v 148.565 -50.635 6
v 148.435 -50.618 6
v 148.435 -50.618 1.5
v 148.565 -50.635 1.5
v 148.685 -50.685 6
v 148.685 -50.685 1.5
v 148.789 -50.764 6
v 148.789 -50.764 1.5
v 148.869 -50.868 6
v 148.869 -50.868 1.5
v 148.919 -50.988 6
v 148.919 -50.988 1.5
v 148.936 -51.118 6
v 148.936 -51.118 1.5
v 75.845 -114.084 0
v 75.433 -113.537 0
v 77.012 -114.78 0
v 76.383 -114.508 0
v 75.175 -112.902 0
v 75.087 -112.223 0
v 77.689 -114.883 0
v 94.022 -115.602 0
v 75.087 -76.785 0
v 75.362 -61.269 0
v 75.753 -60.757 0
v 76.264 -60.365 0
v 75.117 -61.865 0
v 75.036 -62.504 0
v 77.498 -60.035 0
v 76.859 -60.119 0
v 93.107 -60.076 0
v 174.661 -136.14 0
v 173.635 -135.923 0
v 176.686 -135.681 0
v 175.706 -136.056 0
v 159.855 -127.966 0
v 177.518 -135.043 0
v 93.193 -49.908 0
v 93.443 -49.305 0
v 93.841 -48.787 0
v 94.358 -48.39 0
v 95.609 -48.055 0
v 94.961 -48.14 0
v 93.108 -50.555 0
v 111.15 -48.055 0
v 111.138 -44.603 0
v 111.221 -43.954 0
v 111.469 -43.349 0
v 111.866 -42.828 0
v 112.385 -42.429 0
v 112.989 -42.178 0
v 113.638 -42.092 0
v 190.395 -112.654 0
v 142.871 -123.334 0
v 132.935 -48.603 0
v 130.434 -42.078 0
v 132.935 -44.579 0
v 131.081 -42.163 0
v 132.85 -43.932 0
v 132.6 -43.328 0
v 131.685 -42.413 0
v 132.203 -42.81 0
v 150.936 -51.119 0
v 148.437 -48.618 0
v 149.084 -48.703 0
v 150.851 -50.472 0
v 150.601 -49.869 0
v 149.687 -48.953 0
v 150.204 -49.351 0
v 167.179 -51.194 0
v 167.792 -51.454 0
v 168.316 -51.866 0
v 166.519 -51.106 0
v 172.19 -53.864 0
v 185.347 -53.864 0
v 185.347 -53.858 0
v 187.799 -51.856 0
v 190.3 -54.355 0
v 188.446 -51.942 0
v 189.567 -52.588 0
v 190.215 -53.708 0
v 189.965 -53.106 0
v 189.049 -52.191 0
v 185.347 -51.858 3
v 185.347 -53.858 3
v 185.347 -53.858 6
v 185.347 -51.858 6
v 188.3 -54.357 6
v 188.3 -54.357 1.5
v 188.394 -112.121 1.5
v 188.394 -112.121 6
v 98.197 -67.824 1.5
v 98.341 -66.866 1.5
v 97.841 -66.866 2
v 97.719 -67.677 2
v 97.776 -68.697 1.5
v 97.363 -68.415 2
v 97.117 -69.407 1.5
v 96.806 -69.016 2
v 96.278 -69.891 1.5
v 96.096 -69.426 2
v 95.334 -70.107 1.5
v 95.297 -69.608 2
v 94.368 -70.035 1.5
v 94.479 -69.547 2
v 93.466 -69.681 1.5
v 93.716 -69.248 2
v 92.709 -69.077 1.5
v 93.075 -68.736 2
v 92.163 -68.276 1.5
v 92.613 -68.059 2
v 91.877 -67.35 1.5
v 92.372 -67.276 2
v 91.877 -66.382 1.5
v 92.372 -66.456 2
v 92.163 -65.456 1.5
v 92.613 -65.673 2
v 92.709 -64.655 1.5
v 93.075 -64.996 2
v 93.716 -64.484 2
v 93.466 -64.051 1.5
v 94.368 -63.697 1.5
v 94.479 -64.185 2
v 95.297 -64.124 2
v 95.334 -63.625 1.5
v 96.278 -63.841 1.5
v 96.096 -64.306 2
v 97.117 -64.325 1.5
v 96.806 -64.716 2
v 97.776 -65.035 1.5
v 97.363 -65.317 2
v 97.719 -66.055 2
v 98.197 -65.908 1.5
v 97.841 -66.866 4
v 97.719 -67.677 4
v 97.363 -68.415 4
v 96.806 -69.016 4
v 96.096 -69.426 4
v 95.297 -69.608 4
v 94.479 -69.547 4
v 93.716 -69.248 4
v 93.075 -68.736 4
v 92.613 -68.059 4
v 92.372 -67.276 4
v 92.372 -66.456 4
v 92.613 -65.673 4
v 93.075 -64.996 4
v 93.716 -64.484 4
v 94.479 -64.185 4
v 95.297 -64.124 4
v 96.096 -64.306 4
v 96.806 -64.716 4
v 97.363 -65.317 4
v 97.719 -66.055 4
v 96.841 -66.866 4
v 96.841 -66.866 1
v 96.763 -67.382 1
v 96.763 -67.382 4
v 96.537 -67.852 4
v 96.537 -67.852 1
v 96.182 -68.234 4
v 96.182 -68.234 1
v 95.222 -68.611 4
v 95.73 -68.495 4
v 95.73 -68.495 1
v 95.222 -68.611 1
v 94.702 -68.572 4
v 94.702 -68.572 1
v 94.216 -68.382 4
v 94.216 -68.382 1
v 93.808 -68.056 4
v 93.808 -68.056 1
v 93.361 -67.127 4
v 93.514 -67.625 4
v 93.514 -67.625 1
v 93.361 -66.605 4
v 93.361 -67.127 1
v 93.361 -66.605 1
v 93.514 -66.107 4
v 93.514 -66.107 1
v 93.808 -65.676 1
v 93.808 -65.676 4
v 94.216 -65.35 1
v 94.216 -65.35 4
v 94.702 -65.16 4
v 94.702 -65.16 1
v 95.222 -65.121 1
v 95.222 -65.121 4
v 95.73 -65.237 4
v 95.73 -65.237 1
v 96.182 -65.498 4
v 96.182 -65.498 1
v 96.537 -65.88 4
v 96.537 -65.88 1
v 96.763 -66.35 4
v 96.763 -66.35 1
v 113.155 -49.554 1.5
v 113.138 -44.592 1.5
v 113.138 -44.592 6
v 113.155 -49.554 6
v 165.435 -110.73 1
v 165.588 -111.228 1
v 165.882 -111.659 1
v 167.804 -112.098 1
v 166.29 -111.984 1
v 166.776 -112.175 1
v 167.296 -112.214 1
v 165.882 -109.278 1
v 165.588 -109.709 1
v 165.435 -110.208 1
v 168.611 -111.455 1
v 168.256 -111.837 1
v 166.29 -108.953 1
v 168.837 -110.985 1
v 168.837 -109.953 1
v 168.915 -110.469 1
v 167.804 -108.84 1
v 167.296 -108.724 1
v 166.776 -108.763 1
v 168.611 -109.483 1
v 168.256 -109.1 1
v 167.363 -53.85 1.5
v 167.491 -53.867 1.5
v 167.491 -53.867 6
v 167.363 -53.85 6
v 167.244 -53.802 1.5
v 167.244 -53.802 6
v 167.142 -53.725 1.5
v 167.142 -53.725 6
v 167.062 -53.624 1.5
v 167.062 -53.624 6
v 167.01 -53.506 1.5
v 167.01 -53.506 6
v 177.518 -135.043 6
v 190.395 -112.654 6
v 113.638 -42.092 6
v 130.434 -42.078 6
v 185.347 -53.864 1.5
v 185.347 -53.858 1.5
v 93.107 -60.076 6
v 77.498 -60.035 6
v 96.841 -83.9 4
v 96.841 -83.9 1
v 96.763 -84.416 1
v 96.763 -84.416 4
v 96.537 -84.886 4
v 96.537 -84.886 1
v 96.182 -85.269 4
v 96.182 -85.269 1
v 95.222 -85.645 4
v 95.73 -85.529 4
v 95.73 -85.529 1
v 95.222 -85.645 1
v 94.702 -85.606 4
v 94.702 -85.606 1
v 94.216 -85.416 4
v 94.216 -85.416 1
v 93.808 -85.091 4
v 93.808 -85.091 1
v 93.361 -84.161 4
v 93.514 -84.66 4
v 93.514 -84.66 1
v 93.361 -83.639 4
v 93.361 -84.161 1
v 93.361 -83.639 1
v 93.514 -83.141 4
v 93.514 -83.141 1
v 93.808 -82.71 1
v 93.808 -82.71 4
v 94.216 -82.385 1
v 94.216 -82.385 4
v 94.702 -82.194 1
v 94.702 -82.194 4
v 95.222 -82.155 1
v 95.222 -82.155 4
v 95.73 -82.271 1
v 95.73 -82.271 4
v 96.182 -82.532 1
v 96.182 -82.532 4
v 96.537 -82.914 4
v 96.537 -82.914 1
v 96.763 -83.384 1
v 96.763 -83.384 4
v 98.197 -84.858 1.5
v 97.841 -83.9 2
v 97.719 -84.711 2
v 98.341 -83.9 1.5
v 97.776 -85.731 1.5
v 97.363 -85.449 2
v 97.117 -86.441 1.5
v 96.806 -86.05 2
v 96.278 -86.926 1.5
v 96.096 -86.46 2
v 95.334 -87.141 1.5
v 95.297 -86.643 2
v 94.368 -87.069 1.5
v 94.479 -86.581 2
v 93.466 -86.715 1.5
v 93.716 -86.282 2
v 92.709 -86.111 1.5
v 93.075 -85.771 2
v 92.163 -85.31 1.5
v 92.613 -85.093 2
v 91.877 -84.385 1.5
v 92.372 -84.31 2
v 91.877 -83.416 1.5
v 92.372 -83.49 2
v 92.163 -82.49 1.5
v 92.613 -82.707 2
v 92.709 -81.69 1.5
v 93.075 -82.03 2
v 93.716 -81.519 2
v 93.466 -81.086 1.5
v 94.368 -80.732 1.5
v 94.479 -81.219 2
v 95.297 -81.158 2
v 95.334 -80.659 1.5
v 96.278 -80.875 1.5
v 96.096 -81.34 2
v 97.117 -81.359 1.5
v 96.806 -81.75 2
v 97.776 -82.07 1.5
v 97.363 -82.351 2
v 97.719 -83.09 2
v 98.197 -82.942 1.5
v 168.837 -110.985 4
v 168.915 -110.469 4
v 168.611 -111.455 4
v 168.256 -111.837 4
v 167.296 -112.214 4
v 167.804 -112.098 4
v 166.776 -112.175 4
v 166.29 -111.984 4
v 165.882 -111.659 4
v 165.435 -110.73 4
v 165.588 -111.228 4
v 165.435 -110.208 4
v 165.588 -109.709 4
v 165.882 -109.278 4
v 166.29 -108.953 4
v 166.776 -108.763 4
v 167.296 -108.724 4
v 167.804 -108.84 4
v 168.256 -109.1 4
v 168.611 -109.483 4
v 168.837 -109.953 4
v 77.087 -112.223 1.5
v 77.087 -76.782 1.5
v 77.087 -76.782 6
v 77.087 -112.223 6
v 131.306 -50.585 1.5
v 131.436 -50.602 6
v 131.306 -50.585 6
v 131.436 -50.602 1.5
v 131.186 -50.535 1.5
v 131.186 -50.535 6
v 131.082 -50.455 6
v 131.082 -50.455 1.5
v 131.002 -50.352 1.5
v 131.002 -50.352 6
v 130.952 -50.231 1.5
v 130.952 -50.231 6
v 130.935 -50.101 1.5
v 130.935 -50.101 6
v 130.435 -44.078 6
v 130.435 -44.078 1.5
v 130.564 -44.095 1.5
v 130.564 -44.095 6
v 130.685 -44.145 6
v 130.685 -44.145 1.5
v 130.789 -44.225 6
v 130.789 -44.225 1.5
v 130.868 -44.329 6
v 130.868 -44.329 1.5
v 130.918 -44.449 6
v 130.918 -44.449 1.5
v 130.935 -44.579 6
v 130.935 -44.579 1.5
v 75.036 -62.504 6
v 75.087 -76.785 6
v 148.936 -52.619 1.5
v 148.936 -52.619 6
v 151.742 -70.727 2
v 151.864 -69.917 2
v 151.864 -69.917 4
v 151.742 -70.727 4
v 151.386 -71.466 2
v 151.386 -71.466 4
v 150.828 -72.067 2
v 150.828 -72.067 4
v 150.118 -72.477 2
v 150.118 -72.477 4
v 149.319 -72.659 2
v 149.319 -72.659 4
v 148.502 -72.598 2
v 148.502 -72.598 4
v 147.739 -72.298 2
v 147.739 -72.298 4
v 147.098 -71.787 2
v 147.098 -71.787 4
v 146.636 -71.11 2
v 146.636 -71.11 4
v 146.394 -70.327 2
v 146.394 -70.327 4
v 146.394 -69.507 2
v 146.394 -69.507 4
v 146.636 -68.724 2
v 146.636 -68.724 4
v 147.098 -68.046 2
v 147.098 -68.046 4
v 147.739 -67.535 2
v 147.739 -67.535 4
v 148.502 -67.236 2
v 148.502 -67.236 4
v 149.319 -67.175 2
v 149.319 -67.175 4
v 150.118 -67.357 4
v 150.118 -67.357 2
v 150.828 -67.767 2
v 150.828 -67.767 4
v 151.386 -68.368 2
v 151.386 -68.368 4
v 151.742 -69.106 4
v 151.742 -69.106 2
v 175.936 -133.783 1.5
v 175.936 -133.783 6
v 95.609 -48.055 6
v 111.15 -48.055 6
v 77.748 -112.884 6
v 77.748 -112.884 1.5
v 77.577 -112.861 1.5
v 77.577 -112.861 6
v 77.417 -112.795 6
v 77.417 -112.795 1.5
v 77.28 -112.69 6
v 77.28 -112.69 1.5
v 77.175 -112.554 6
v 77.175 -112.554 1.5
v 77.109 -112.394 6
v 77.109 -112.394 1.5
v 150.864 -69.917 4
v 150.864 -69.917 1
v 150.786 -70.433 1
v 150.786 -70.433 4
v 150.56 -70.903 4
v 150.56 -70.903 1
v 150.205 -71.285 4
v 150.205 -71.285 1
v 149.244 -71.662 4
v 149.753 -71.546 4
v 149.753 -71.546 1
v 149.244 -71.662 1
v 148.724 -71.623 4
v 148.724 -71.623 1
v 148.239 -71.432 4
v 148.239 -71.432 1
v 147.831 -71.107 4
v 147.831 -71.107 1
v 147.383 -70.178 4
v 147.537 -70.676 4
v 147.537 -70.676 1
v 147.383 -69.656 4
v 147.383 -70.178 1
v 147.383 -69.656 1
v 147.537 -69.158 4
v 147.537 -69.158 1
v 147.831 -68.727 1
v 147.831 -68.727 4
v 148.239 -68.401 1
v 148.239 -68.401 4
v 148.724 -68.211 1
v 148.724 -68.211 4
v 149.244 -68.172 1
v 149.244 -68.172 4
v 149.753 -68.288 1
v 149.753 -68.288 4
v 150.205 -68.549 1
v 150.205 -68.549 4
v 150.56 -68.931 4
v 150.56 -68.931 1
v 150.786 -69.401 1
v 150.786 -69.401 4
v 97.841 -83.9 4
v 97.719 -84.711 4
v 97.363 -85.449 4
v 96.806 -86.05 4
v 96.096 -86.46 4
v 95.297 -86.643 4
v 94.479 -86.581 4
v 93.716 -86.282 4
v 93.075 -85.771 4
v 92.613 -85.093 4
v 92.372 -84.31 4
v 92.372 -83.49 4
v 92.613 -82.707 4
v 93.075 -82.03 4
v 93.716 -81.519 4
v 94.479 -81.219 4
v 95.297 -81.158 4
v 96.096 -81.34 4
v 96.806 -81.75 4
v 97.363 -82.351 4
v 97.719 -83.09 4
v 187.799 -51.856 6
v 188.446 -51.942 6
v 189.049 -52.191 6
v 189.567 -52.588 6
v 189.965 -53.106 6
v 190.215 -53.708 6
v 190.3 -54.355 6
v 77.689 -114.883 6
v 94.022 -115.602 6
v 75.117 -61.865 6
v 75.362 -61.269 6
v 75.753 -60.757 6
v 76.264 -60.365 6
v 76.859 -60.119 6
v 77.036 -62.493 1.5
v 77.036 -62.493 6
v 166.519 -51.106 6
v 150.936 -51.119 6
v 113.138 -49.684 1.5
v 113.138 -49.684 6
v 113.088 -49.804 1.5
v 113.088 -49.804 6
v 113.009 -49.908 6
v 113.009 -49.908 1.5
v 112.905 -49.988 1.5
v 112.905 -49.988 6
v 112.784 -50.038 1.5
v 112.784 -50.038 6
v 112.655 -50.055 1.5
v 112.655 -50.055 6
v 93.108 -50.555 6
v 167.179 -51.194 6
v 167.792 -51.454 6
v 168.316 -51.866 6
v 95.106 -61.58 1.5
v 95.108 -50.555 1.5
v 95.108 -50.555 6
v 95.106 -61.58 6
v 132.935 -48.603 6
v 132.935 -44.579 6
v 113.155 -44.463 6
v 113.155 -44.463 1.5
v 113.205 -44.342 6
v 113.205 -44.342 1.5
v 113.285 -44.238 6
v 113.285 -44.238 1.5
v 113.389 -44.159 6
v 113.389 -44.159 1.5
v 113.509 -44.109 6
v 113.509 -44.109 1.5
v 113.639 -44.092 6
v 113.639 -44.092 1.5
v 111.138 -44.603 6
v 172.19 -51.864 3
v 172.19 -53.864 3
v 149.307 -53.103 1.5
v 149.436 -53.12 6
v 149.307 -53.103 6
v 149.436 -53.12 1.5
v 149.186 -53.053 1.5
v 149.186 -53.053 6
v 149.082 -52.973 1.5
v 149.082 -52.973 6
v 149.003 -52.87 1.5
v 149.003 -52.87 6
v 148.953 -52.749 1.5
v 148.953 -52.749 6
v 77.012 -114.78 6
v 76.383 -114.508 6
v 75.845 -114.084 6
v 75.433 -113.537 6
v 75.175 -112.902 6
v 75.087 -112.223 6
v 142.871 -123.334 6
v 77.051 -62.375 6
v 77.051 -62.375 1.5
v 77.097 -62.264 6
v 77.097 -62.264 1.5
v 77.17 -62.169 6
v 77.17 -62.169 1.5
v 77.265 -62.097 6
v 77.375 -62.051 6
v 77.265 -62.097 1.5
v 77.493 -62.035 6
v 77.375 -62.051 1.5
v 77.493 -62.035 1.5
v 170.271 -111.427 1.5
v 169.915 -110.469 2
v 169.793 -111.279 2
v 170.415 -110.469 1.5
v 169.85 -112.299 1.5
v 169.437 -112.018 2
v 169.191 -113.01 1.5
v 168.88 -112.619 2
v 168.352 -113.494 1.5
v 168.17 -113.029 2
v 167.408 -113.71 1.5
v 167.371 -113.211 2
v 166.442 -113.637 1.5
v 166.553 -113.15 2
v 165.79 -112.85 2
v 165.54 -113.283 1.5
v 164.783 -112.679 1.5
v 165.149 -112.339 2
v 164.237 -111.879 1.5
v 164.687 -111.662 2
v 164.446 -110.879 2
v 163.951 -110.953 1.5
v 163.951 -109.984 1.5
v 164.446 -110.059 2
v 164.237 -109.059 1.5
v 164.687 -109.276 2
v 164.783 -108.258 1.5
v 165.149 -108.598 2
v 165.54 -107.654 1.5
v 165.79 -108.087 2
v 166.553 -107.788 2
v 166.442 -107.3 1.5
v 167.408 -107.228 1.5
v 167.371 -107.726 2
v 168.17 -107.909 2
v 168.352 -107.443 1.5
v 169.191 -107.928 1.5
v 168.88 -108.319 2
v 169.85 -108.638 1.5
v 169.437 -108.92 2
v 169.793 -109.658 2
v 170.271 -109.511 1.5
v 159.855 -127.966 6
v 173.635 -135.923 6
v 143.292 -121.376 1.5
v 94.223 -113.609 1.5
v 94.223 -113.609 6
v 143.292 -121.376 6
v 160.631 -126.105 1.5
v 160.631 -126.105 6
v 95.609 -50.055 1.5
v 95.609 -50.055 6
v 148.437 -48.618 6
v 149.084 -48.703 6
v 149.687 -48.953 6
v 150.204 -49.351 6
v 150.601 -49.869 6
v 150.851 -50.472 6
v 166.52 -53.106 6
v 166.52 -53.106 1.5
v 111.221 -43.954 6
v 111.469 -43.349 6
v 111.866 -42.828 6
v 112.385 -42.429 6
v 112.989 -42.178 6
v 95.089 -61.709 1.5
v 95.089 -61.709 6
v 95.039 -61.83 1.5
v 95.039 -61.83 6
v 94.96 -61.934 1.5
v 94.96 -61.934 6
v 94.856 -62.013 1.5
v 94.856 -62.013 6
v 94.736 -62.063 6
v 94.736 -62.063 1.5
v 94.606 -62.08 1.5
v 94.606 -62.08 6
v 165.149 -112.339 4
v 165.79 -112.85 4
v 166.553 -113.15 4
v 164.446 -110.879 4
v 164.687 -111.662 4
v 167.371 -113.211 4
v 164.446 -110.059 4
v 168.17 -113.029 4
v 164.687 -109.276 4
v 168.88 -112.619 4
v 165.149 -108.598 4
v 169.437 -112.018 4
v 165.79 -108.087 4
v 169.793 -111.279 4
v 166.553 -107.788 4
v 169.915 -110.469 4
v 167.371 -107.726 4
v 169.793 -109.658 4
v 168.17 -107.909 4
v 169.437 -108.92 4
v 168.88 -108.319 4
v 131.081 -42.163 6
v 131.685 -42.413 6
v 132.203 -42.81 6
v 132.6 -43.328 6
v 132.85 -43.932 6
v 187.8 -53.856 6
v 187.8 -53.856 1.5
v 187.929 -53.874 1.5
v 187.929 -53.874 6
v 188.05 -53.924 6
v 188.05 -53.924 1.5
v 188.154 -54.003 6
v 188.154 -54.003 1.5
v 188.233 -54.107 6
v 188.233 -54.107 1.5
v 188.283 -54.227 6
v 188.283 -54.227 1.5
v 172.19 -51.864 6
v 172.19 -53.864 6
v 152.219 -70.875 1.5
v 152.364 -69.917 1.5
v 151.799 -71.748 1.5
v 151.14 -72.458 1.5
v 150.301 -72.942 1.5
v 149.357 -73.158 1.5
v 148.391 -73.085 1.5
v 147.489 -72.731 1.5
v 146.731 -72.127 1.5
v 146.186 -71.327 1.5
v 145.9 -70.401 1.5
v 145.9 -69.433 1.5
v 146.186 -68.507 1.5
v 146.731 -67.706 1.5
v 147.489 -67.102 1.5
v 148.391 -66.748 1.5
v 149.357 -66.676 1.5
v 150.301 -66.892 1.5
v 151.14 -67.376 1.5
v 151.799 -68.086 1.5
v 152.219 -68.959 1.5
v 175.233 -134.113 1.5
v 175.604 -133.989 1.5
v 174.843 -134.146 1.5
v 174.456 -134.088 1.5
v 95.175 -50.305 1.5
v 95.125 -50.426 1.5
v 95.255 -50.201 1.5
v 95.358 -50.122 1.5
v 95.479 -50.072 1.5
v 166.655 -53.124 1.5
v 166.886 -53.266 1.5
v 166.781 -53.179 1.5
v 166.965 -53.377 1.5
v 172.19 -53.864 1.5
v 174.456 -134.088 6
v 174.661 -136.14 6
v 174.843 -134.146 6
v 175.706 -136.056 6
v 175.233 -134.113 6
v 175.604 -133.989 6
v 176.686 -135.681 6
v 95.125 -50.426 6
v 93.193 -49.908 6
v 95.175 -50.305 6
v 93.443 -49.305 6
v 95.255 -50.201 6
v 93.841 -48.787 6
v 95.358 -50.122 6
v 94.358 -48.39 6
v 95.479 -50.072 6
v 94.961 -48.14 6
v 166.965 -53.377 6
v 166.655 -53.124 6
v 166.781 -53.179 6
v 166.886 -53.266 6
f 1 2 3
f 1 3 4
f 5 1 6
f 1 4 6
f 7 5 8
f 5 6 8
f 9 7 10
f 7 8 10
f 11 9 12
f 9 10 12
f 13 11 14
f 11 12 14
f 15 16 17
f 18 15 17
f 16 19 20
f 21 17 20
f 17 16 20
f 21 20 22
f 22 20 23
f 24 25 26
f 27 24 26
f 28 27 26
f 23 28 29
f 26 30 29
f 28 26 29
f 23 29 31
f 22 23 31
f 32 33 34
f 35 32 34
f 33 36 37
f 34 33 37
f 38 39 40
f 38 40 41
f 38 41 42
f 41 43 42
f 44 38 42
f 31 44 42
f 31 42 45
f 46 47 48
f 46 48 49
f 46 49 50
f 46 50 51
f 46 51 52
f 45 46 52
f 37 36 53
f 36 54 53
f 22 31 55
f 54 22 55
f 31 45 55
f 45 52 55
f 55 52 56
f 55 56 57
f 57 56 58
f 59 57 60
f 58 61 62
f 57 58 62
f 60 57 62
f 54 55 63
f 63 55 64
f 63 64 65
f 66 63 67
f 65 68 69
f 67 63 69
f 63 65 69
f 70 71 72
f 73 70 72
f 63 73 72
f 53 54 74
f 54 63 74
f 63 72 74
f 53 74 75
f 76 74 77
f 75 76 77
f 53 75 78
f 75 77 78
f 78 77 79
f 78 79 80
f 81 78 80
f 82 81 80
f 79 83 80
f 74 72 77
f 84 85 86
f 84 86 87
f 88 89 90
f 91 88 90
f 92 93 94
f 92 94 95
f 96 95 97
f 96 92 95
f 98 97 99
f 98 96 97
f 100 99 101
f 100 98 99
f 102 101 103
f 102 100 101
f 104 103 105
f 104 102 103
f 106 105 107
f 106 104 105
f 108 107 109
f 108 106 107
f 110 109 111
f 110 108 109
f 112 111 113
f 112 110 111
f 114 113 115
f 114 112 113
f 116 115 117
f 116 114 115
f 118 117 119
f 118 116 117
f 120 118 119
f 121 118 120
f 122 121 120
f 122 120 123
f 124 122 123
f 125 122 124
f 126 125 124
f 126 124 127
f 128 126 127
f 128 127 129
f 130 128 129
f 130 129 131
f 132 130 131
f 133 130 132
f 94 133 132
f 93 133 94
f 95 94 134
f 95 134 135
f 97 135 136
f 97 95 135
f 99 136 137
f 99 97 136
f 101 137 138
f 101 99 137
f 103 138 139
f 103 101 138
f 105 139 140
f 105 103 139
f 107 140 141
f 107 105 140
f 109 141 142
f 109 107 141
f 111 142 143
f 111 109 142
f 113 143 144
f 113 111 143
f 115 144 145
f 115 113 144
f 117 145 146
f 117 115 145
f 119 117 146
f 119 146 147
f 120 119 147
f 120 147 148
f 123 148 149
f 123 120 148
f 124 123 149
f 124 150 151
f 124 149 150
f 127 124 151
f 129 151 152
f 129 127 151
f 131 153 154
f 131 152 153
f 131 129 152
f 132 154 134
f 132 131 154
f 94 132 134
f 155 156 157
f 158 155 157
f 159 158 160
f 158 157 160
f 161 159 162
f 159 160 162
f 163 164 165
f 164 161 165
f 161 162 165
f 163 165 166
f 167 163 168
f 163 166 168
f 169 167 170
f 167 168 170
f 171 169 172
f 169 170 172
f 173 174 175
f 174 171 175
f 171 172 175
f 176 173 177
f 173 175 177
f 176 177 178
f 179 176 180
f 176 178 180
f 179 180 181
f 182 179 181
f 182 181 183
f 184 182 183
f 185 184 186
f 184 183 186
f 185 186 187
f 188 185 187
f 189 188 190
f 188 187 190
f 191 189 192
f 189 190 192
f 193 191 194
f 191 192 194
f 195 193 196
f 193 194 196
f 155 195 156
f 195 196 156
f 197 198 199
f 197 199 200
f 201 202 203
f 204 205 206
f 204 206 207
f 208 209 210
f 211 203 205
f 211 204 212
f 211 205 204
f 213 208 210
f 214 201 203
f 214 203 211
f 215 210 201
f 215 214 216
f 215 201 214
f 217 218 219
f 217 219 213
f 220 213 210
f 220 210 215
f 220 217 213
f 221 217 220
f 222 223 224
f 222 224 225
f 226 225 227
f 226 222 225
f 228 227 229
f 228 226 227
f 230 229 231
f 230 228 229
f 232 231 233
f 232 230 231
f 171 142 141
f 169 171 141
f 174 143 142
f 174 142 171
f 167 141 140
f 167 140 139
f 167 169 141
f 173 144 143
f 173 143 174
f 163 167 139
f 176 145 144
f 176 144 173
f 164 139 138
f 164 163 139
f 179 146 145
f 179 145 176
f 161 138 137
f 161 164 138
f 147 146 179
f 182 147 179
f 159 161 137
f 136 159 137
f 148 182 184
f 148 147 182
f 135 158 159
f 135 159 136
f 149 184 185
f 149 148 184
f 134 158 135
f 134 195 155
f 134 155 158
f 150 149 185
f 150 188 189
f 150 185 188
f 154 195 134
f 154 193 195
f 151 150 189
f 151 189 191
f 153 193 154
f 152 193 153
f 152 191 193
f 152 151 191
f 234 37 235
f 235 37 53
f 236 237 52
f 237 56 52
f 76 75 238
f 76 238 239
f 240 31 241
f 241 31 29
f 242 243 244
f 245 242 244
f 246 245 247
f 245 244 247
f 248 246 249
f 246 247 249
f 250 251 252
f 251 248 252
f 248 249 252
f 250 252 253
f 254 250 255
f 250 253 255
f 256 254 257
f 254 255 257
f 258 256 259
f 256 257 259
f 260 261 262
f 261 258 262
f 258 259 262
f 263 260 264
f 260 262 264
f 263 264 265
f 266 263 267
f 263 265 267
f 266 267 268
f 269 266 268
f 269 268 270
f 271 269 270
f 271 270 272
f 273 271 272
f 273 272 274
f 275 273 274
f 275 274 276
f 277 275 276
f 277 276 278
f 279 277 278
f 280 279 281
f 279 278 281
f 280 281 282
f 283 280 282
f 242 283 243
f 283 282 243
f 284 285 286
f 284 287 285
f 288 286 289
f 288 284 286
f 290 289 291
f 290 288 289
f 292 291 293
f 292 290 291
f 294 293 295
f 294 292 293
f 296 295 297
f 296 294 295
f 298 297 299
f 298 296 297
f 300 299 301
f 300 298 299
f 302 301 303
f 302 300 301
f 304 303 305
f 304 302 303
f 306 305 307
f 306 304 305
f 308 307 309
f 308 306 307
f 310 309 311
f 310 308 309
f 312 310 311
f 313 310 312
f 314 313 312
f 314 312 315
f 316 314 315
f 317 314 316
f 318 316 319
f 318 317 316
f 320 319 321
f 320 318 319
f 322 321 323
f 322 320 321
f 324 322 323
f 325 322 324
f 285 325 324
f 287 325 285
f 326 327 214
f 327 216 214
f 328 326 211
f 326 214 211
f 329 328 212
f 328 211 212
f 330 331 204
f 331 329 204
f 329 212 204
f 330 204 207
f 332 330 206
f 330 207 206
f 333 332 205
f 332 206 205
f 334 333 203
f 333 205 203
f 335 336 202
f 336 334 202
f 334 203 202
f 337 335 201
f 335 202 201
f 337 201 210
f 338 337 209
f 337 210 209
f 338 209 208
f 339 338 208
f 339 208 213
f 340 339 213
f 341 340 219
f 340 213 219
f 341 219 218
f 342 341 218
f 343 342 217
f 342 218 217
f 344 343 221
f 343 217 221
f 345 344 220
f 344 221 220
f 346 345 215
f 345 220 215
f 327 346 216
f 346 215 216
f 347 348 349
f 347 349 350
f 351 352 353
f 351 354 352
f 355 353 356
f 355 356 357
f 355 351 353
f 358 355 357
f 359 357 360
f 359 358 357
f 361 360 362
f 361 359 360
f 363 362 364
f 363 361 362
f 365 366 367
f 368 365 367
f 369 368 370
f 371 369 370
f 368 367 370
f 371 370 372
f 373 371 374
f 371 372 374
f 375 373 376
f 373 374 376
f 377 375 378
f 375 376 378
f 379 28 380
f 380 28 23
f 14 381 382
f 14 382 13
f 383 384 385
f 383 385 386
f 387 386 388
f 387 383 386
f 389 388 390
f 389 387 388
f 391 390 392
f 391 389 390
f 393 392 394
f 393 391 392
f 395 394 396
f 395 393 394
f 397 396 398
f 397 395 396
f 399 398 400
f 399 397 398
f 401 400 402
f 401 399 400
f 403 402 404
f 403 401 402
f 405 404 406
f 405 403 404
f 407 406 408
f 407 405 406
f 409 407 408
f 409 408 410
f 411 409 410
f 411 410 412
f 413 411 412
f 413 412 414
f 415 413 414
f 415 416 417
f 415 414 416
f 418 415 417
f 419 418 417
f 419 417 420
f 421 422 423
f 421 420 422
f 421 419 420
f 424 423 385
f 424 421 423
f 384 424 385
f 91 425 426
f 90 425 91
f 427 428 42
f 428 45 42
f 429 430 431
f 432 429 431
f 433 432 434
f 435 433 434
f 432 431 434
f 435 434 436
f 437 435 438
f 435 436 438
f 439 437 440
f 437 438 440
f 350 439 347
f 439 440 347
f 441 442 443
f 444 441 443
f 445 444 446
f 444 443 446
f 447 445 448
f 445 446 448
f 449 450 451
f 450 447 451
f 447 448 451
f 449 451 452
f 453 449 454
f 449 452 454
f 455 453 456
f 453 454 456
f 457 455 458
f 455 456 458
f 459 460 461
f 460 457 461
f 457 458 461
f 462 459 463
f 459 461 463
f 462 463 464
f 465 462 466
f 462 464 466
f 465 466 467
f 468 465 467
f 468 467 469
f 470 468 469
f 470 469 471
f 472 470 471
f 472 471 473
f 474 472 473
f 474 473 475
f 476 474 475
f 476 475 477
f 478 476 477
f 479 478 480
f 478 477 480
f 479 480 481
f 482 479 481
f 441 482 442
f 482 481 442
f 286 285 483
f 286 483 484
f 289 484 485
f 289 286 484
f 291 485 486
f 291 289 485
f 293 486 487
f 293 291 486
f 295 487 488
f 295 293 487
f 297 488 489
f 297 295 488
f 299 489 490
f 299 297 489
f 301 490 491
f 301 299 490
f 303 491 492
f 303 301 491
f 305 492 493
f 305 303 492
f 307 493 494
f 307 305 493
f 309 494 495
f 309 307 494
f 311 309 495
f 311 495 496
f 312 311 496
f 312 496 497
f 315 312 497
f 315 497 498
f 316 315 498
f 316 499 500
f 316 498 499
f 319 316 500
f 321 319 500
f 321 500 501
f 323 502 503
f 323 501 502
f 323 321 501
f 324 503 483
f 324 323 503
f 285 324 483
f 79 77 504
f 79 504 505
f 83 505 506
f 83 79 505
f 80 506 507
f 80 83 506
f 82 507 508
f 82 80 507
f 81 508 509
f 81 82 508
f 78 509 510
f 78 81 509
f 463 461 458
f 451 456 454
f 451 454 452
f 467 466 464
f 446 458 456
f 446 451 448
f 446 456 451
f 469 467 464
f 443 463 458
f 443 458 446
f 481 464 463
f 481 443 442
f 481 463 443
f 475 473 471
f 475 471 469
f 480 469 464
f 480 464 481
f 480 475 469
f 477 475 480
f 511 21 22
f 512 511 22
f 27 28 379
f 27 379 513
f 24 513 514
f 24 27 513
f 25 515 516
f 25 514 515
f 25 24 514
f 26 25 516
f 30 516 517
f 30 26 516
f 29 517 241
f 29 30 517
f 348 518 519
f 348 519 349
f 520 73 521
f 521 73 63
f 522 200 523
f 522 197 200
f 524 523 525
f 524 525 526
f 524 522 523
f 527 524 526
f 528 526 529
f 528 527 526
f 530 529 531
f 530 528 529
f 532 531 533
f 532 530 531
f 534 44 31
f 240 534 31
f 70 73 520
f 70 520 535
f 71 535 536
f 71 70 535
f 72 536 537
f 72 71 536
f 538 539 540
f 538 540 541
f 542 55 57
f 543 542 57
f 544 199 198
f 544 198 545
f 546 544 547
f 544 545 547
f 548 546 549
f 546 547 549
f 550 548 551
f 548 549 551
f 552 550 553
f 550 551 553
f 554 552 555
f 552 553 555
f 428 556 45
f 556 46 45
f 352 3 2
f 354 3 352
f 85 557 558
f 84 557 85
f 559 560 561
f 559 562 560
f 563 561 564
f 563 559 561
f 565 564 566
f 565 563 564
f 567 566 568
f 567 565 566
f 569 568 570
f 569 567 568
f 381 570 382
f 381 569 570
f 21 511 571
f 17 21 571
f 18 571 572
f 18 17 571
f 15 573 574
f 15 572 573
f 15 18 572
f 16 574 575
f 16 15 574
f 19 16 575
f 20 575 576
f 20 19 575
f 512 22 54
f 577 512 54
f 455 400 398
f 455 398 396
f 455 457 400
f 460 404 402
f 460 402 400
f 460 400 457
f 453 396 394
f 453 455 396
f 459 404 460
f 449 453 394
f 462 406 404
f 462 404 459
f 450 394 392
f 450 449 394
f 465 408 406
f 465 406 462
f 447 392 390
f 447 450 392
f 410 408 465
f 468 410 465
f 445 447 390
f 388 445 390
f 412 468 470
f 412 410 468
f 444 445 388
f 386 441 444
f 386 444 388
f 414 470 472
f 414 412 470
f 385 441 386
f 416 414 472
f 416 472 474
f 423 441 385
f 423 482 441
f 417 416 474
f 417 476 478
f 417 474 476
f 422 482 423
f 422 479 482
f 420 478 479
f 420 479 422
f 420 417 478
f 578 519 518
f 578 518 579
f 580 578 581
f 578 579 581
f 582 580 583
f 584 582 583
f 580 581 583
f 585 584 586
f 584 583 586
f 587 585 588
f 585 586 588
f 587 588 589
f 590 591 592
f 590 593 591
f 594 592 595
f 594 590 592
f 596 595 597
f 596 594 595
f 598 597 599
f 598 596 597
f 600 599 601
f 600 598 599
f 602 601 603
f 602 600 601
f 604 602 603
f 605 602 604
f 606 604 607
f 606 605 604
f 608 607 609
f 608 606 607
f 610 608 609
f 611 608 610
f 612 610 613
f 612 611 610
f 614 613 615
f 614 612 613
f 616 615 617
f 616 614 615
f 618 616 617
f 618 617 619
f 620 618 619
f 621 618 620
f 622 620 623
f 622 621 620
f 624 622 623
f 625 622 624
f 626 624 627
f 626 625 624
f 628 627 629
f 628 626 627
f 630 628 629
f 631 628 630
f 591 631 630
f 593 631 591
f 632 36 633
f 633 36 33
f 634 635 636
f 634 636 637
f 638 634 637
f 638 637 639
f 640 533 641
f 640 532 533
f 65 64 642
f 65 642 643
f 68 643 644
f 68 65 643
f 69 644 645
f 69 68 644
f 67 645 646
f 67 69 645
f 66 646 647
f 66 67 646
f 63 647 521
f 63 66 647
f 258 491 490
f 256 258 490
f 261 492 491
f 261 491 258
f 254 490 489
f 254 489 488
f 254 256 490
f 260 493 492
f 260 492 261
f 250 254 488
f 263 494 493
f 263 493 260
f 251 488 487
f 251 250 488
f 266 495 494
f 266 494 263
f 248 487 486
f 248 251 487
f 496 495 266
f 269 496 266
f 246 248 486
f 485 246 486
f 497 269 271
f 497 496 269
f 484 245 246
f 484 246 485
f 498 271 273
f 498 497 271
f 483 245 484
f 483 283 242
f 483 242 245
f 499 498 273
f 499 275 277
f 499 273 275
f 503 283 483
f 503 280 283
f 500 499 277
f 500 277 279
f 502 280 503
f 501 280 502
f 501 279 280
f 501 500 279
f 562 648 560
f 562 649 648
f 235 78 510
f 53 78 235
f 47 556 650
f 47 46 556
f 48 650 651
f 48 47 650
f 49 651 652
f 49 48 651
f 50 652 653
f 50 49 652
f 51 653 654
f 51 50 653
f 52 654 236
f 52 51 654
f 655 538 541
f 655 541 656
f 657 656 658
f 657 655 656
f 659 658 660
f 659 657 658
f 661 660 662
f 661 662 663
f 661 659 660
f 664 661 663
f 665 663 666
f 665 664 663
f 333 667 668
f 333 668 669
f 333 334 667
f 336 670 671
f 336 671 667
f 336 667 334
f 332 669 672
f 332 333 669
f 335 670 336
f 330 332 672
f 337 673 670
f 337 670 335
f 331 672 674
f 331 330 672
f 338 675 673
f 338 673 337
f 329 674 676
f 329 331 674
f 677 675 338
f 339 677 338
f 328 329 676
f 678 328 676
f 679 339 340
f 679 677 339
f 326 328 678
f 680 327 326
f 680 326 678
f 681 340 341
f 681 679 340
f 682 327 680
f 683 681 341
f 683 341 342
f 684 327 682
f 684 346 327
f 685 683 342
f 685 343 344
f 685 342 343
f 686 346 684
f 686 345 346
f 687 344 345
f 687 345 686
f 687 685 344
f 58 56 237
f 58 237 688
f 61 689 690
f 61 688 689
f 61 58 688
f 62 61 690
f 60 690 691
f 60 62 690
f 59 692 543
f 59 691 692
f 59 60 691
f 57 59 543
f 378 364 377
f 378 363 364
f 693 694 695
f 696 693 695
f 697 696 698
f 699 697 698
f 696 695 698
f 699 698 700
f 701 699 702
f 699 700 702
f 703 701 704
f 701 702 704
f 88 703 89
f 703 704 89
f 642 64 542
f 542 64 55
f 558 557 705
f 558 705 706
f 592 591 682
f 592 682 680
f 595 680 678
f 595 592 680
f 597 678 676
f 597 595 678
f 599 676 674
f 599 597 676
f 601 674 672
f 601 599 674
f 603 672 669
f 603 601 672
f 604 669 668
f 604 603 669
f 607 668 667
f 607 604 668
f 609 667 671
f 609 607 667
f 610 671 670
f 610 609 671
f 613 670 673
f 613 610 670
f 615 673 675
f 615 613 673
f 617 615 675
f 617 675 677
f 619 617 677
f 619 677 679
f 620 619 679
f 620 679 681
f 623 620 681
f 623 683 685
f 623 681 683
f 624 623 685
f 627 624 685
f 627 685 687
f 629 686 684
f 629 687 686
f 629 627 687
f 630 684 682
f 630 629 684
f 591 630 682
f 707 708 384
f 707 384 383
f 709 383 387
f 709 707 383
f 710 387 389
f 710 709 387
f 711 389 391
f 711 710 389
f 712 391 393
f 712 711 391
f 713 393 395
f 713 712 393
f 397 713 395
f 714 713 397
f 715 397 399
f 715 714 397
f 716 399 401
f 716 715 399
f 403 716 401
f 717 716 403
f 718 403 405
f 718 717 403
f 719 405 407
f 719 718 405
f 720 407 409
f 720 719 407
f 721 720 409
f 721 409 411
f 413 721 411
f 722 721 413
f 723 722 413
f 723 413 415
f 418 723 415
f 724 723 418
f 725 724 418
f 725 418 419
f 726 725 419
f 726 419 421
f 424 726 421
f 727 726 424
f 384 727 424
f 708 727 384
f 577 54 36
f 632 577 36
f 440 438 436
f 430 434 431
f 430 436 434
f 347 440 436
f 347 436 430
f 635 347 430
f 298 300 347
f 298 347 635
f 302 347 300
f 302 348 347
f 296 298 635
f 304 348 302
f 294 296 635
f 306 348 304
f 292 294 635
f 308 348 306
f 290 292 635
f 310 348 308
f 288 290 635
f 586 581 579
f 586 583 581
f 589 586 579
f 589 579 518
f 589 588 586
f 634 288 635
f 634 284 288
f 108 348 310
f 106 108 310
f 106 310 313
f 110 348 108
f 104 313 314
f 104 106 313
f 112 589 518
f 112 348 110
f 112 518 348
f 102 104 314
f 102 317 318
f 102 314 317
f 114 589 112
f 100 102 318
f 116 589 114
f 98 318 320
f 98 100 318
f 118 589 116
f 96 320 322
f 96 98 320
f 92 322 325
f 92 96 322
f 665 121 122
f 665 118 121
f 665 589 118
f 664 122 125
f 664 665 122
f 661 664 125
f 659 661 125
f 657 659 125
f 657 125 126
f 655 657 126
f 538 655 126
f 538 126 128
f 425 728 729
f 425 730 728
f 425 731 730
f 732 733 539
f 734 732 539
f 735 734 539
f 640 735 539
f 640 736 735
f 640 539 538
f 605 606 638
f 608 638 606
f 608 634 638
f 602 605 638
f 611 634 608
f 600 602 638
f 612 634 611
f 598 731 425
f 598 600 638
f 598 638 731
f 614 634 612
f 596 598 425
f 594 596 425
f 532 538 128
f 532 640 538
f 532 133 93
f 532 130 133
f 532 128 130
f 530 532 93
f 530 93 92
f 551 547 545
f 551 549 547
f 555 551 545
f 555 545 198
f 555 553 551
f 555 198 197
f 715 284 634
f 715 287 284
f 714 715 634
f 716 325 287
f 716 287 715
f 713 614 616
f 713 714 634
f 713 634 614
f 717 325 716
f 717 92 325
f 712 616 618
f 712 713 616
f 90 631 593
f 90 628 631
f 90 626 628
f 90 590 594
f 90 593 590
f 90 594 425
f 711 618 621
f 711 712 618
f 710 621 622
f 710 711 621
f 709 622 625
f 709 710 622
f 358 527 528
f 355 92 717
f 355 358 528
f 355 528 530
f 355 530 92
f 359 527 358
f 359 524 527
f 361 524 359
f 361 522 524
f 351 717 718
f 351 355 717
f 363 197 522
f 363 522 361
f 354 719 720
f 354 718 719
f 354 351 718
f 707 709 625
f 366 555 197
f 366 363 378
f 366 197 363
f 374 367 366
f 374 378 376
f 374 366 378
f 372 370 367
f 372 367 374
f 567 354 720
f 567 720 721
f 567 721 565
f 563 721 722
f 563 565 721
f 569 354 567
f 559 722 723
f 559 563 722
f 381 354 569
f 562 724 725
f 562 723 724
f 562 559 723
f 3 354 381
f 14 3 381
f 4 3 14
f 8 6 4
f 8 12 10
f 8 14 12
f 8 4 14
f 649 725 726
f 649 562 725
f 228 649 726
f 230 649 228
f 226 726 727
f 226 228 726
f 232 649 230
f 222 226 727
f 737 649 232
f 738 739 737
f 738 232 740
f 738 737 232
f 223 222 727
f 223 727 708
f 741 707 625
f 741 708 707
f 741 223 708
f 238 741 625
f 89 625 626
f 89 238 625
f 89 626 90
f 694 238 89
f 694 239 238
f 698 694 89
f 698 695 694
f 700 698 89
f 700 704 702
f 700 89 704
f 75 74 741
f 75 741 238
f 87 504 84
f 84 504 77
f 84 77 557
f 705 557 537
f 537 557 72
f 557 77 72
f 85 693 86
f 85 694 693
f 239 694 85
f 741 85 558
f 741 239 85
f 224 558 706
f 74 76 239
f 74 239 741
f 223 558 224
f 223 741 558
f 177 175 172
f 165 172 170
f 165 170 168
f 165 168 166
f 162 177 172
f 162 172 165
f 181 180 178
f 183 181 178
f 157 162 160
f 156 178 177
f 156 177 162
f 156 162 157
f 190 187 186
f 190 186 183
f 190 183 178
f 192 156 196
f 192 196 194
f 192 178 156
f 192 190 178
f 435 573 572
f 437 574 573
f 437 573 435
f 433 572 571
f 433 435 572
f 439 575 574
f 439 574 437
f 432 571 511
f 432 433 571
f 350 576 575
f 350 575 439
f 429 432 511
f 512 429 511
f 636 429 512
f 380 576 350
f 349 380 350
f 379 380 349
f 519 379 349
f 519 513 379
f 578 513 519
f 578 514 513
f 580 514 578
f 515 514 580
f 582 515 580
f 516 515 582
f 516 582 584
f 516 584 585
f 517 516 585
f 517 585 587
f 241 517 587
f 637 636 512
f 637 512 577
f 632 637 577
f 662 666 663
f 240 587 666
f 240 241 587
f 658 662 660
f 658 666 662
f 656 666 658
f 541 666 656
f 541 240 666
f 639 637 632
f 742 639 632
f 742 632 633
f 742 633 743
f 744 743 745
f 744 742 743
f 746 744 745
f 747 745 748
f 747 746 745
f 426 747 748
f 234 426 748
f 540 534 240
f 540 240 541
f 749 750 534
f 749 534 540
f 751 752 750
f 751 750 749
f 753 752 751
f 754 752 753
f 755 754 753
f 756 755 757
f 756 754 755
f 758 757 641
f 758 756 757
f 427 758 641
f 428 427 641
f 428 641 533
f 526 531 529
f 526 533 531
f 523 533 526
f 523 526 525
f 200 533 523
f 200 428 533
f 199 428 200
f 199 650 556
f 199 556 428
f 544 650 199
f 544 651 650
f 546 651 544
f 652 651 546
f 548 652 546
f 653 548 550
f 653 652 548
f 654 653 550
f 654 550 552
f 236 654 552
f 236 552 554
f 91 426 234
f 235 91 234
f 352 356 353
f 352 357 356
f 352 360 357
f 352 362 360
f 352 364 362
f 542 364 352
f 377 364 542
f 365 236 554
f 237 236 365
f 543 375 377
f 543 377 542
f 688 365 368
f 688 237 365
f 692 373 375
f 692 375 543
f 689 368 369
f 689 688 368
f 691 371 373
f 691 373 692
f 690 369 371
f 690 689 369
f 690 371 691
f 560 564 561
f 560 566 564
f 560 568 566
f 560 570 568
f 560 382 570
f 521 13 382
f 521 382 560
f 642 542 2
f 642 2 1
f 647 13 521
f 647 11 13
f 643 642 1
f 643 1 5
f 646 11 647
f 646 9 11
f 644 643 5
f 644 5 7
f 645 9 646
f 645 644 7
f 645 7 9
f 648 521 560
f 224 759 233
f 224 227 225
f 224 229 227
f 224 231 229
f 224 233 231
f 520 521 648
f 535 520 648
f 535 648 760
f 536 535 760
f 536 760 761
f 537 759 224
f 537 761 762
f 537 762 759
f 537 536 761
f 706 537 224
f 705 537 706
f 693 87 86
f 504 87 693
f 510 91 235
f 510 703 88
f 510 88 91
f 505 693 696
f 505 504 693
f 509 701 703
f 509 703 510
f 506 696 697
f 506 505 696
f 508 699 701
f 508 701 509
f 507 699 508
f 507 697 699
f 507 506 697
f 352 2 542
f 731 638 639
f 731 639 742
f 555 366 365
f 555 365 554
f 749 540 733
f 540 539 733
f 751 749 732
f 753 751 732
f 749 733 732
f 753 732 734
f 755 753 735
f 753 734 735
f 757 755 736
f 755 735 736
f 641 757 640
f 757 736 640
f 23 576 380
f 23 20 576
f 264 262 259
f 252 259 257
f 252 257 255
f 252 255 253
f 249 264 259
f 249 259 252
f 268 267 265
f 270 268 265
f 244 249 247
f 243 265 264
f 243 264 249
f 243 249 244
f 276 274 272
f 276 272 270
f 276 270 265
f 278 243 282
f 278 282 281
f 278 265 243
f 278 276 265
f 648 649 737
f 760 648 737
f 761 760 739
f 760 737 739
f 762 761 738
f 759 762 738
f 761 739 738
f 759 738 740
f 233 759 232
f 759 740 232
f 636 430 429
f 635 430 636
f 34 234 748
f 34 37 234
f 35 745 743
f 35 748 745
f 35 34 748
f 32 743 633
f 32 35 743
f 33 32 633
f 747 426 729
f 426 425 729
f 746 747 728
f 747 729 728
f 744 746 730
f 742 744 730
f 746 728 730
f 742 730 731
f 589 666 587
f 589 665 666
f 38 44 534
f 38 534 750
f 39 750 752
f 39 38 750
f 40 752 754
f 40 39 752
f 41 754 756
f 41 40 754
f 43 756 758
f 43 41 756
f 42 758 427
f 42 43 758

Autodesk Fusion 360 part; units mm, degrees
sketch "Sketch1" plane through (0, 0, 0) normal (0, 0, 1) x (1, 0, 0)
  line L0 (187.7997, -53.8565) -> (167.4907, -53.8666)
  line L1 (94.606, -62.0803) -> (77.4933, -62.0354)
  line L2 (160.6309, -126.1047) -> (174.4556, -134.0879)
  arc A0 (166.5198, -53.1058) -> (167.0103, -53.5064) centre (166.5198, -53.6063) cw
  arc A1 (167.4907, -53.8666) -> (167.0103, -53.5064) centre (167.4907, -53.3661) cw
  line L3 (166.5198, -53.1058) -> (149.4362, -53.1198)
  arc A2 (95.1065, -61.5798) -> (94.606, -62.0803) centre (94.6059, -61.5797) cw
  arc A3 (95.1081, -50.5552) -> (95.6086, -50.0547) centre (95.6086, -50.5552) cw
  line L4 (130.4348, -44.0784) -> (113.6387, -44.0918)
  line L5 (130.9353, -50.1013) -> (130.9353, -44.5789)
  line L6 (148.4352, -50.6175) -> (131.4358, -50.6018)
  line L7 (148.9357, -52.6194) -> (148.9357, -51.1179)
  line L8 (95.1081, -50.5552) -> (95.1065, -61.5798)
  line L9 (112.6549, -50.0547) -> (95.6086, -50.0547)
  line L10 (113.1383, -44.5922) -> (113.1554, -49.5542)
  arc A4 (113.1554, -49.5542) -> (112.6549, -50.0547) centre (112.6549, -49.5542) cw
  arc A5 (113.1383, -44.5922) -> (113.6387, -44.0918) centre (113.6387, -44.5923) cw
  arc A6 (130.4348, -44.0784) -> (130.9353, -44.5789) centre (130.4348, -44.5789) cw
  arc A7 (131.4358, -50.6018) -> (130.9353, -50.1013) centre (131.4358, -50.1013) cw
  arc A8 (148.4352, -50.6175) -> (148.9357, -51.1179) centre (148.4352, -51.1179) cw
  arc A9 (149.4362, -53.1198) -> (148.9357, -52.6194) centre (149.4362, -52.6193) cw
  arc A10 (187.7997, -53.8565) -> (188.3002, -54.357) centre (187.7997, -54.357) cw
  line L11 (94.2226, -113.6087) -> (143.2915, -121.3757)
  arc A11 (175.9364, -133.7828) -> (174.4556, -134.0879) centre (174.8961, -132.4797) cw
  line L12 (77.0866, -93.8666) -> (77.0866, -110.8501)
  line L13 (77.0357, -62.493) -> (77.0866, -76.7815)
  line L14 (188.3002, -54.357) -> (188.3943, -112.1213)
  line L15 (77.0866, -112.223) -> (77.0866, -110.8501)
  line L16 (77.0866, -76.7815) -> (77.0866, -93.8666)
  arc A12 (77.0357, -62.493) -> (77.4933, -62.0354) centre (77.4934, -62.493) cw
  line L17 (77.7476, -112.884) -> (94.2226, -113.6087)
  line L18 (143.2915, -121.3757) -> (160.6309, -126.1047)
  arc A13 (77.7476, -112.884) -> (77.0866, -112.223) centre (77.7476, -112.223) cw
  line L19 (175.9364, -133.7828) -> (188.3943, -112.1213)
  circle A14 centre (95.091, -66.866) radius 2.75
  circle A15 centre (95.091, -66.866) radius 1.75
  circle A16 centre (95.091, -83.9003) radius 2.75
  circle A17 centre (95.091, -83.9003) radius 1.75
  circle A18 centre (149.1137, -69.9169) radius 2.75
  circle A19 centre (149.1137, -69.9169) radius 1.75
  circle A20 centre (167.165, -110.4687) radius 2.75
  circle A21 centre (167.165, -110.4687) radius 1.75
  line L20 (177.5185, -135.0434) -> (190.3951, -112.6539)
  line L21 (190.3002, -54.3554) -> (190.3951, -112.6539)
  arc A22 (190.3002, -54.3554) -> (187.7992, -51.8565) centre (187.7997, -54.357) ccw
  line L22 (187.7992, -51.8565) -> (168.3155, -51.8662)
  arc A23 (168.3155, -51.8662) -> (166.519, -51.1058) centre (166.5198, -53.6063) ccw
  line L23 (166.519, -51.1058) -> (150.9357, -51.1186)
  line L24 (150.9357, -51.1186) -> (150.9357, -51.1179)
  arc A24 (150.9357, -51.1179) -> (148.4369, -48.6175) centre (148.4352, -51.1179) ccw
  line L25 (148.4369, -48.6175) -> (132.9353, -48.6032)
  line L26 (132.9353, -48.6032) -> (132.9353, -44.5789)
  arc A25 (132.9353, -44.5789) -> (130.434, -42.0784) centre (130.4348, -44.5789) ccw
  line L27 (130.434, -42.0784) -> (113.6379, -42.0918)
  arc A26 (113.6379, -42.0918) -> (111.1383, -44.6032) centre (113.6387, -44.5923) ccw
  line L28 (111.1383, -44.6032) -> (111.1502, -48.0547)
  line L29 (111.1502, -48.0547) -> (95.6086, -48.0547)
  arc A27 (95.6086, -48.0547) -> (93.1081, -50.5551) centre (95.6086, -50.5552) ccw
  line L30 (93.1081, -50.5551) -> (93.1067, -60.0763)
  line L31 (93.1067, -60.0763) -> (77.4982, -60.0354)
  arc A28 (77.4982, -60.0354) -> (75.0357, -62.5039) centre (77.4934, -62.493) ccw
  line L32 (75.0357, -62.5039) -> (75.0866, -76.785)
  line L33 (75.0866, -76.785) -> (75.0866, -93.8666)
  line L34 (75.0866, -93.8666) -> (75.0866, -110.8501)
  line L35 (75.0866, -112.223) -> (75.0866, -110.8501)
  arc A29 (75.0866, -112.223) -> (77.6889, -114.8834) centre (77.7476, -112.223) ccw
  line L36 (77.6889, -114.8834) -> (94.0216, -115.6018)
  line L37 (94.0216, -115.6018) -> (142.8708, -123.334)
  line L38 (142.8708, -123.334) -> (159.8549, -127.9661)
  line L39 (159.8549, -127.9661) -> (173.6348, -135.9234)
  arc A30 (173.6348, -135.9234) -> (177.5185, -135.0434) centre (174.8961, -132.4797) ccw
  line L40 (172.1905, -53.8642) -> (185.3472, -53.8642)
  line L41 (185.3472, -53.8642) -> (185.3472, -51.8577)
  line L42 (185.3472, -51.8577) -> (172.1905, -51.8577)
  line L43 (172.1905, -51.8577) -> (172.1905, -53.8642)
  point P0 (95.091, -83.9003)
  point P1 (149.1137, -69.9169)
  point P2 (167.165, -110.4687)
  dimension "d1" = 5.5
  dimension "d2" = 3.5
  dimension "d3" = 5.5
  dimension "d4" = 3.5
  dimension "d5" = 5.5
  dimension "d6" = 3.5
  dimension "d7" = 5.5
  dimension "d8" = 3.5
  dimension "d9" = -2
extrude "Extrude1" add sketch "Sketch1" along normal blind 1.5 contours L0 L1 L2 A0 A1 L3 A2 A3 L4 L5 L6 L7 L8 L9 L10 A4 A5 A6 A7 A8 A9 A10 L11 A11 L12 L13 L14 L15 L16 A12 L17 L18 A13 L19 L40 L41 makes body 1
extrude "Extrude2" add sketch "Sketch1" along normal blind 1 separate body contours A15 makes body 2
extrude "Extrude3" add sketch "Sketch1" along normal blind 1 separate body contours A17 makes body 3
extrude "Extrude4" add sketch "Sketch1" along normal blind 1 separate body contours A19 makes body 4
extrude "Extrude5" add sketch "Sketch1" along normal blind 1 separate body contours A21 makes body 5
extrude "Extrude6" add sketch "Sketch1" along normal blind 4 contours A14 bodies 1 2
extrude "Extrude7" add sketch "Sketch1" along normal blind 4 contours A16 bodies 1 3
extrude "Extrude8" add sketch "Sketch1" along normal blind 4 contours A18 bodies 1 4
extrude "Extrude9" add sketch "Sketch1" along normal blind 4 contours A20 bodies 1 5
extrude "Extrude10" add sketch "Sketch1" along normal blind 6 contours L0 L1 L2 A0 A1 L3 A2 A3 L4 L5 L6 L7 L8 L9 L10 A4 A5 A6 A7 A8 A9 A10 L11 A11 L12 L13 L14 L15 L16 A12 L17 L18 A13 L19 L20 L21 A22 L22 A23 L23 A24 L25 L26 A25 L27 A26 L28 L29 A27 L30 L31 A28 L32 L33 L34 L35 A29 L36 L37 L38 L39 A30 L41 L43 bodies 1
extrude "Extrude11" add sketch "Sketch1" along normal blind 3 contours L0 L22 L41 L43 bodies 1
chamfer "Chamfer1" distance 0.5 angle 45 1 edges at (92.5271, -82.9058, 1.5) on bodies 1
chamfer "Chamfer2" distance 0.5 angle 45 1 edges at (92.5271, -65.8715, 1.5) on bodies 1
chamfer "Chamfer3" distance 0.5 angle 45 1 edges at (146.5498, -68.9225, 1.5) on bodies 1
chamfer "Chamfer4" distance 0.5 angle 45 1 edges at (164.6011, -109.4743, 1.5) on bodies 1
